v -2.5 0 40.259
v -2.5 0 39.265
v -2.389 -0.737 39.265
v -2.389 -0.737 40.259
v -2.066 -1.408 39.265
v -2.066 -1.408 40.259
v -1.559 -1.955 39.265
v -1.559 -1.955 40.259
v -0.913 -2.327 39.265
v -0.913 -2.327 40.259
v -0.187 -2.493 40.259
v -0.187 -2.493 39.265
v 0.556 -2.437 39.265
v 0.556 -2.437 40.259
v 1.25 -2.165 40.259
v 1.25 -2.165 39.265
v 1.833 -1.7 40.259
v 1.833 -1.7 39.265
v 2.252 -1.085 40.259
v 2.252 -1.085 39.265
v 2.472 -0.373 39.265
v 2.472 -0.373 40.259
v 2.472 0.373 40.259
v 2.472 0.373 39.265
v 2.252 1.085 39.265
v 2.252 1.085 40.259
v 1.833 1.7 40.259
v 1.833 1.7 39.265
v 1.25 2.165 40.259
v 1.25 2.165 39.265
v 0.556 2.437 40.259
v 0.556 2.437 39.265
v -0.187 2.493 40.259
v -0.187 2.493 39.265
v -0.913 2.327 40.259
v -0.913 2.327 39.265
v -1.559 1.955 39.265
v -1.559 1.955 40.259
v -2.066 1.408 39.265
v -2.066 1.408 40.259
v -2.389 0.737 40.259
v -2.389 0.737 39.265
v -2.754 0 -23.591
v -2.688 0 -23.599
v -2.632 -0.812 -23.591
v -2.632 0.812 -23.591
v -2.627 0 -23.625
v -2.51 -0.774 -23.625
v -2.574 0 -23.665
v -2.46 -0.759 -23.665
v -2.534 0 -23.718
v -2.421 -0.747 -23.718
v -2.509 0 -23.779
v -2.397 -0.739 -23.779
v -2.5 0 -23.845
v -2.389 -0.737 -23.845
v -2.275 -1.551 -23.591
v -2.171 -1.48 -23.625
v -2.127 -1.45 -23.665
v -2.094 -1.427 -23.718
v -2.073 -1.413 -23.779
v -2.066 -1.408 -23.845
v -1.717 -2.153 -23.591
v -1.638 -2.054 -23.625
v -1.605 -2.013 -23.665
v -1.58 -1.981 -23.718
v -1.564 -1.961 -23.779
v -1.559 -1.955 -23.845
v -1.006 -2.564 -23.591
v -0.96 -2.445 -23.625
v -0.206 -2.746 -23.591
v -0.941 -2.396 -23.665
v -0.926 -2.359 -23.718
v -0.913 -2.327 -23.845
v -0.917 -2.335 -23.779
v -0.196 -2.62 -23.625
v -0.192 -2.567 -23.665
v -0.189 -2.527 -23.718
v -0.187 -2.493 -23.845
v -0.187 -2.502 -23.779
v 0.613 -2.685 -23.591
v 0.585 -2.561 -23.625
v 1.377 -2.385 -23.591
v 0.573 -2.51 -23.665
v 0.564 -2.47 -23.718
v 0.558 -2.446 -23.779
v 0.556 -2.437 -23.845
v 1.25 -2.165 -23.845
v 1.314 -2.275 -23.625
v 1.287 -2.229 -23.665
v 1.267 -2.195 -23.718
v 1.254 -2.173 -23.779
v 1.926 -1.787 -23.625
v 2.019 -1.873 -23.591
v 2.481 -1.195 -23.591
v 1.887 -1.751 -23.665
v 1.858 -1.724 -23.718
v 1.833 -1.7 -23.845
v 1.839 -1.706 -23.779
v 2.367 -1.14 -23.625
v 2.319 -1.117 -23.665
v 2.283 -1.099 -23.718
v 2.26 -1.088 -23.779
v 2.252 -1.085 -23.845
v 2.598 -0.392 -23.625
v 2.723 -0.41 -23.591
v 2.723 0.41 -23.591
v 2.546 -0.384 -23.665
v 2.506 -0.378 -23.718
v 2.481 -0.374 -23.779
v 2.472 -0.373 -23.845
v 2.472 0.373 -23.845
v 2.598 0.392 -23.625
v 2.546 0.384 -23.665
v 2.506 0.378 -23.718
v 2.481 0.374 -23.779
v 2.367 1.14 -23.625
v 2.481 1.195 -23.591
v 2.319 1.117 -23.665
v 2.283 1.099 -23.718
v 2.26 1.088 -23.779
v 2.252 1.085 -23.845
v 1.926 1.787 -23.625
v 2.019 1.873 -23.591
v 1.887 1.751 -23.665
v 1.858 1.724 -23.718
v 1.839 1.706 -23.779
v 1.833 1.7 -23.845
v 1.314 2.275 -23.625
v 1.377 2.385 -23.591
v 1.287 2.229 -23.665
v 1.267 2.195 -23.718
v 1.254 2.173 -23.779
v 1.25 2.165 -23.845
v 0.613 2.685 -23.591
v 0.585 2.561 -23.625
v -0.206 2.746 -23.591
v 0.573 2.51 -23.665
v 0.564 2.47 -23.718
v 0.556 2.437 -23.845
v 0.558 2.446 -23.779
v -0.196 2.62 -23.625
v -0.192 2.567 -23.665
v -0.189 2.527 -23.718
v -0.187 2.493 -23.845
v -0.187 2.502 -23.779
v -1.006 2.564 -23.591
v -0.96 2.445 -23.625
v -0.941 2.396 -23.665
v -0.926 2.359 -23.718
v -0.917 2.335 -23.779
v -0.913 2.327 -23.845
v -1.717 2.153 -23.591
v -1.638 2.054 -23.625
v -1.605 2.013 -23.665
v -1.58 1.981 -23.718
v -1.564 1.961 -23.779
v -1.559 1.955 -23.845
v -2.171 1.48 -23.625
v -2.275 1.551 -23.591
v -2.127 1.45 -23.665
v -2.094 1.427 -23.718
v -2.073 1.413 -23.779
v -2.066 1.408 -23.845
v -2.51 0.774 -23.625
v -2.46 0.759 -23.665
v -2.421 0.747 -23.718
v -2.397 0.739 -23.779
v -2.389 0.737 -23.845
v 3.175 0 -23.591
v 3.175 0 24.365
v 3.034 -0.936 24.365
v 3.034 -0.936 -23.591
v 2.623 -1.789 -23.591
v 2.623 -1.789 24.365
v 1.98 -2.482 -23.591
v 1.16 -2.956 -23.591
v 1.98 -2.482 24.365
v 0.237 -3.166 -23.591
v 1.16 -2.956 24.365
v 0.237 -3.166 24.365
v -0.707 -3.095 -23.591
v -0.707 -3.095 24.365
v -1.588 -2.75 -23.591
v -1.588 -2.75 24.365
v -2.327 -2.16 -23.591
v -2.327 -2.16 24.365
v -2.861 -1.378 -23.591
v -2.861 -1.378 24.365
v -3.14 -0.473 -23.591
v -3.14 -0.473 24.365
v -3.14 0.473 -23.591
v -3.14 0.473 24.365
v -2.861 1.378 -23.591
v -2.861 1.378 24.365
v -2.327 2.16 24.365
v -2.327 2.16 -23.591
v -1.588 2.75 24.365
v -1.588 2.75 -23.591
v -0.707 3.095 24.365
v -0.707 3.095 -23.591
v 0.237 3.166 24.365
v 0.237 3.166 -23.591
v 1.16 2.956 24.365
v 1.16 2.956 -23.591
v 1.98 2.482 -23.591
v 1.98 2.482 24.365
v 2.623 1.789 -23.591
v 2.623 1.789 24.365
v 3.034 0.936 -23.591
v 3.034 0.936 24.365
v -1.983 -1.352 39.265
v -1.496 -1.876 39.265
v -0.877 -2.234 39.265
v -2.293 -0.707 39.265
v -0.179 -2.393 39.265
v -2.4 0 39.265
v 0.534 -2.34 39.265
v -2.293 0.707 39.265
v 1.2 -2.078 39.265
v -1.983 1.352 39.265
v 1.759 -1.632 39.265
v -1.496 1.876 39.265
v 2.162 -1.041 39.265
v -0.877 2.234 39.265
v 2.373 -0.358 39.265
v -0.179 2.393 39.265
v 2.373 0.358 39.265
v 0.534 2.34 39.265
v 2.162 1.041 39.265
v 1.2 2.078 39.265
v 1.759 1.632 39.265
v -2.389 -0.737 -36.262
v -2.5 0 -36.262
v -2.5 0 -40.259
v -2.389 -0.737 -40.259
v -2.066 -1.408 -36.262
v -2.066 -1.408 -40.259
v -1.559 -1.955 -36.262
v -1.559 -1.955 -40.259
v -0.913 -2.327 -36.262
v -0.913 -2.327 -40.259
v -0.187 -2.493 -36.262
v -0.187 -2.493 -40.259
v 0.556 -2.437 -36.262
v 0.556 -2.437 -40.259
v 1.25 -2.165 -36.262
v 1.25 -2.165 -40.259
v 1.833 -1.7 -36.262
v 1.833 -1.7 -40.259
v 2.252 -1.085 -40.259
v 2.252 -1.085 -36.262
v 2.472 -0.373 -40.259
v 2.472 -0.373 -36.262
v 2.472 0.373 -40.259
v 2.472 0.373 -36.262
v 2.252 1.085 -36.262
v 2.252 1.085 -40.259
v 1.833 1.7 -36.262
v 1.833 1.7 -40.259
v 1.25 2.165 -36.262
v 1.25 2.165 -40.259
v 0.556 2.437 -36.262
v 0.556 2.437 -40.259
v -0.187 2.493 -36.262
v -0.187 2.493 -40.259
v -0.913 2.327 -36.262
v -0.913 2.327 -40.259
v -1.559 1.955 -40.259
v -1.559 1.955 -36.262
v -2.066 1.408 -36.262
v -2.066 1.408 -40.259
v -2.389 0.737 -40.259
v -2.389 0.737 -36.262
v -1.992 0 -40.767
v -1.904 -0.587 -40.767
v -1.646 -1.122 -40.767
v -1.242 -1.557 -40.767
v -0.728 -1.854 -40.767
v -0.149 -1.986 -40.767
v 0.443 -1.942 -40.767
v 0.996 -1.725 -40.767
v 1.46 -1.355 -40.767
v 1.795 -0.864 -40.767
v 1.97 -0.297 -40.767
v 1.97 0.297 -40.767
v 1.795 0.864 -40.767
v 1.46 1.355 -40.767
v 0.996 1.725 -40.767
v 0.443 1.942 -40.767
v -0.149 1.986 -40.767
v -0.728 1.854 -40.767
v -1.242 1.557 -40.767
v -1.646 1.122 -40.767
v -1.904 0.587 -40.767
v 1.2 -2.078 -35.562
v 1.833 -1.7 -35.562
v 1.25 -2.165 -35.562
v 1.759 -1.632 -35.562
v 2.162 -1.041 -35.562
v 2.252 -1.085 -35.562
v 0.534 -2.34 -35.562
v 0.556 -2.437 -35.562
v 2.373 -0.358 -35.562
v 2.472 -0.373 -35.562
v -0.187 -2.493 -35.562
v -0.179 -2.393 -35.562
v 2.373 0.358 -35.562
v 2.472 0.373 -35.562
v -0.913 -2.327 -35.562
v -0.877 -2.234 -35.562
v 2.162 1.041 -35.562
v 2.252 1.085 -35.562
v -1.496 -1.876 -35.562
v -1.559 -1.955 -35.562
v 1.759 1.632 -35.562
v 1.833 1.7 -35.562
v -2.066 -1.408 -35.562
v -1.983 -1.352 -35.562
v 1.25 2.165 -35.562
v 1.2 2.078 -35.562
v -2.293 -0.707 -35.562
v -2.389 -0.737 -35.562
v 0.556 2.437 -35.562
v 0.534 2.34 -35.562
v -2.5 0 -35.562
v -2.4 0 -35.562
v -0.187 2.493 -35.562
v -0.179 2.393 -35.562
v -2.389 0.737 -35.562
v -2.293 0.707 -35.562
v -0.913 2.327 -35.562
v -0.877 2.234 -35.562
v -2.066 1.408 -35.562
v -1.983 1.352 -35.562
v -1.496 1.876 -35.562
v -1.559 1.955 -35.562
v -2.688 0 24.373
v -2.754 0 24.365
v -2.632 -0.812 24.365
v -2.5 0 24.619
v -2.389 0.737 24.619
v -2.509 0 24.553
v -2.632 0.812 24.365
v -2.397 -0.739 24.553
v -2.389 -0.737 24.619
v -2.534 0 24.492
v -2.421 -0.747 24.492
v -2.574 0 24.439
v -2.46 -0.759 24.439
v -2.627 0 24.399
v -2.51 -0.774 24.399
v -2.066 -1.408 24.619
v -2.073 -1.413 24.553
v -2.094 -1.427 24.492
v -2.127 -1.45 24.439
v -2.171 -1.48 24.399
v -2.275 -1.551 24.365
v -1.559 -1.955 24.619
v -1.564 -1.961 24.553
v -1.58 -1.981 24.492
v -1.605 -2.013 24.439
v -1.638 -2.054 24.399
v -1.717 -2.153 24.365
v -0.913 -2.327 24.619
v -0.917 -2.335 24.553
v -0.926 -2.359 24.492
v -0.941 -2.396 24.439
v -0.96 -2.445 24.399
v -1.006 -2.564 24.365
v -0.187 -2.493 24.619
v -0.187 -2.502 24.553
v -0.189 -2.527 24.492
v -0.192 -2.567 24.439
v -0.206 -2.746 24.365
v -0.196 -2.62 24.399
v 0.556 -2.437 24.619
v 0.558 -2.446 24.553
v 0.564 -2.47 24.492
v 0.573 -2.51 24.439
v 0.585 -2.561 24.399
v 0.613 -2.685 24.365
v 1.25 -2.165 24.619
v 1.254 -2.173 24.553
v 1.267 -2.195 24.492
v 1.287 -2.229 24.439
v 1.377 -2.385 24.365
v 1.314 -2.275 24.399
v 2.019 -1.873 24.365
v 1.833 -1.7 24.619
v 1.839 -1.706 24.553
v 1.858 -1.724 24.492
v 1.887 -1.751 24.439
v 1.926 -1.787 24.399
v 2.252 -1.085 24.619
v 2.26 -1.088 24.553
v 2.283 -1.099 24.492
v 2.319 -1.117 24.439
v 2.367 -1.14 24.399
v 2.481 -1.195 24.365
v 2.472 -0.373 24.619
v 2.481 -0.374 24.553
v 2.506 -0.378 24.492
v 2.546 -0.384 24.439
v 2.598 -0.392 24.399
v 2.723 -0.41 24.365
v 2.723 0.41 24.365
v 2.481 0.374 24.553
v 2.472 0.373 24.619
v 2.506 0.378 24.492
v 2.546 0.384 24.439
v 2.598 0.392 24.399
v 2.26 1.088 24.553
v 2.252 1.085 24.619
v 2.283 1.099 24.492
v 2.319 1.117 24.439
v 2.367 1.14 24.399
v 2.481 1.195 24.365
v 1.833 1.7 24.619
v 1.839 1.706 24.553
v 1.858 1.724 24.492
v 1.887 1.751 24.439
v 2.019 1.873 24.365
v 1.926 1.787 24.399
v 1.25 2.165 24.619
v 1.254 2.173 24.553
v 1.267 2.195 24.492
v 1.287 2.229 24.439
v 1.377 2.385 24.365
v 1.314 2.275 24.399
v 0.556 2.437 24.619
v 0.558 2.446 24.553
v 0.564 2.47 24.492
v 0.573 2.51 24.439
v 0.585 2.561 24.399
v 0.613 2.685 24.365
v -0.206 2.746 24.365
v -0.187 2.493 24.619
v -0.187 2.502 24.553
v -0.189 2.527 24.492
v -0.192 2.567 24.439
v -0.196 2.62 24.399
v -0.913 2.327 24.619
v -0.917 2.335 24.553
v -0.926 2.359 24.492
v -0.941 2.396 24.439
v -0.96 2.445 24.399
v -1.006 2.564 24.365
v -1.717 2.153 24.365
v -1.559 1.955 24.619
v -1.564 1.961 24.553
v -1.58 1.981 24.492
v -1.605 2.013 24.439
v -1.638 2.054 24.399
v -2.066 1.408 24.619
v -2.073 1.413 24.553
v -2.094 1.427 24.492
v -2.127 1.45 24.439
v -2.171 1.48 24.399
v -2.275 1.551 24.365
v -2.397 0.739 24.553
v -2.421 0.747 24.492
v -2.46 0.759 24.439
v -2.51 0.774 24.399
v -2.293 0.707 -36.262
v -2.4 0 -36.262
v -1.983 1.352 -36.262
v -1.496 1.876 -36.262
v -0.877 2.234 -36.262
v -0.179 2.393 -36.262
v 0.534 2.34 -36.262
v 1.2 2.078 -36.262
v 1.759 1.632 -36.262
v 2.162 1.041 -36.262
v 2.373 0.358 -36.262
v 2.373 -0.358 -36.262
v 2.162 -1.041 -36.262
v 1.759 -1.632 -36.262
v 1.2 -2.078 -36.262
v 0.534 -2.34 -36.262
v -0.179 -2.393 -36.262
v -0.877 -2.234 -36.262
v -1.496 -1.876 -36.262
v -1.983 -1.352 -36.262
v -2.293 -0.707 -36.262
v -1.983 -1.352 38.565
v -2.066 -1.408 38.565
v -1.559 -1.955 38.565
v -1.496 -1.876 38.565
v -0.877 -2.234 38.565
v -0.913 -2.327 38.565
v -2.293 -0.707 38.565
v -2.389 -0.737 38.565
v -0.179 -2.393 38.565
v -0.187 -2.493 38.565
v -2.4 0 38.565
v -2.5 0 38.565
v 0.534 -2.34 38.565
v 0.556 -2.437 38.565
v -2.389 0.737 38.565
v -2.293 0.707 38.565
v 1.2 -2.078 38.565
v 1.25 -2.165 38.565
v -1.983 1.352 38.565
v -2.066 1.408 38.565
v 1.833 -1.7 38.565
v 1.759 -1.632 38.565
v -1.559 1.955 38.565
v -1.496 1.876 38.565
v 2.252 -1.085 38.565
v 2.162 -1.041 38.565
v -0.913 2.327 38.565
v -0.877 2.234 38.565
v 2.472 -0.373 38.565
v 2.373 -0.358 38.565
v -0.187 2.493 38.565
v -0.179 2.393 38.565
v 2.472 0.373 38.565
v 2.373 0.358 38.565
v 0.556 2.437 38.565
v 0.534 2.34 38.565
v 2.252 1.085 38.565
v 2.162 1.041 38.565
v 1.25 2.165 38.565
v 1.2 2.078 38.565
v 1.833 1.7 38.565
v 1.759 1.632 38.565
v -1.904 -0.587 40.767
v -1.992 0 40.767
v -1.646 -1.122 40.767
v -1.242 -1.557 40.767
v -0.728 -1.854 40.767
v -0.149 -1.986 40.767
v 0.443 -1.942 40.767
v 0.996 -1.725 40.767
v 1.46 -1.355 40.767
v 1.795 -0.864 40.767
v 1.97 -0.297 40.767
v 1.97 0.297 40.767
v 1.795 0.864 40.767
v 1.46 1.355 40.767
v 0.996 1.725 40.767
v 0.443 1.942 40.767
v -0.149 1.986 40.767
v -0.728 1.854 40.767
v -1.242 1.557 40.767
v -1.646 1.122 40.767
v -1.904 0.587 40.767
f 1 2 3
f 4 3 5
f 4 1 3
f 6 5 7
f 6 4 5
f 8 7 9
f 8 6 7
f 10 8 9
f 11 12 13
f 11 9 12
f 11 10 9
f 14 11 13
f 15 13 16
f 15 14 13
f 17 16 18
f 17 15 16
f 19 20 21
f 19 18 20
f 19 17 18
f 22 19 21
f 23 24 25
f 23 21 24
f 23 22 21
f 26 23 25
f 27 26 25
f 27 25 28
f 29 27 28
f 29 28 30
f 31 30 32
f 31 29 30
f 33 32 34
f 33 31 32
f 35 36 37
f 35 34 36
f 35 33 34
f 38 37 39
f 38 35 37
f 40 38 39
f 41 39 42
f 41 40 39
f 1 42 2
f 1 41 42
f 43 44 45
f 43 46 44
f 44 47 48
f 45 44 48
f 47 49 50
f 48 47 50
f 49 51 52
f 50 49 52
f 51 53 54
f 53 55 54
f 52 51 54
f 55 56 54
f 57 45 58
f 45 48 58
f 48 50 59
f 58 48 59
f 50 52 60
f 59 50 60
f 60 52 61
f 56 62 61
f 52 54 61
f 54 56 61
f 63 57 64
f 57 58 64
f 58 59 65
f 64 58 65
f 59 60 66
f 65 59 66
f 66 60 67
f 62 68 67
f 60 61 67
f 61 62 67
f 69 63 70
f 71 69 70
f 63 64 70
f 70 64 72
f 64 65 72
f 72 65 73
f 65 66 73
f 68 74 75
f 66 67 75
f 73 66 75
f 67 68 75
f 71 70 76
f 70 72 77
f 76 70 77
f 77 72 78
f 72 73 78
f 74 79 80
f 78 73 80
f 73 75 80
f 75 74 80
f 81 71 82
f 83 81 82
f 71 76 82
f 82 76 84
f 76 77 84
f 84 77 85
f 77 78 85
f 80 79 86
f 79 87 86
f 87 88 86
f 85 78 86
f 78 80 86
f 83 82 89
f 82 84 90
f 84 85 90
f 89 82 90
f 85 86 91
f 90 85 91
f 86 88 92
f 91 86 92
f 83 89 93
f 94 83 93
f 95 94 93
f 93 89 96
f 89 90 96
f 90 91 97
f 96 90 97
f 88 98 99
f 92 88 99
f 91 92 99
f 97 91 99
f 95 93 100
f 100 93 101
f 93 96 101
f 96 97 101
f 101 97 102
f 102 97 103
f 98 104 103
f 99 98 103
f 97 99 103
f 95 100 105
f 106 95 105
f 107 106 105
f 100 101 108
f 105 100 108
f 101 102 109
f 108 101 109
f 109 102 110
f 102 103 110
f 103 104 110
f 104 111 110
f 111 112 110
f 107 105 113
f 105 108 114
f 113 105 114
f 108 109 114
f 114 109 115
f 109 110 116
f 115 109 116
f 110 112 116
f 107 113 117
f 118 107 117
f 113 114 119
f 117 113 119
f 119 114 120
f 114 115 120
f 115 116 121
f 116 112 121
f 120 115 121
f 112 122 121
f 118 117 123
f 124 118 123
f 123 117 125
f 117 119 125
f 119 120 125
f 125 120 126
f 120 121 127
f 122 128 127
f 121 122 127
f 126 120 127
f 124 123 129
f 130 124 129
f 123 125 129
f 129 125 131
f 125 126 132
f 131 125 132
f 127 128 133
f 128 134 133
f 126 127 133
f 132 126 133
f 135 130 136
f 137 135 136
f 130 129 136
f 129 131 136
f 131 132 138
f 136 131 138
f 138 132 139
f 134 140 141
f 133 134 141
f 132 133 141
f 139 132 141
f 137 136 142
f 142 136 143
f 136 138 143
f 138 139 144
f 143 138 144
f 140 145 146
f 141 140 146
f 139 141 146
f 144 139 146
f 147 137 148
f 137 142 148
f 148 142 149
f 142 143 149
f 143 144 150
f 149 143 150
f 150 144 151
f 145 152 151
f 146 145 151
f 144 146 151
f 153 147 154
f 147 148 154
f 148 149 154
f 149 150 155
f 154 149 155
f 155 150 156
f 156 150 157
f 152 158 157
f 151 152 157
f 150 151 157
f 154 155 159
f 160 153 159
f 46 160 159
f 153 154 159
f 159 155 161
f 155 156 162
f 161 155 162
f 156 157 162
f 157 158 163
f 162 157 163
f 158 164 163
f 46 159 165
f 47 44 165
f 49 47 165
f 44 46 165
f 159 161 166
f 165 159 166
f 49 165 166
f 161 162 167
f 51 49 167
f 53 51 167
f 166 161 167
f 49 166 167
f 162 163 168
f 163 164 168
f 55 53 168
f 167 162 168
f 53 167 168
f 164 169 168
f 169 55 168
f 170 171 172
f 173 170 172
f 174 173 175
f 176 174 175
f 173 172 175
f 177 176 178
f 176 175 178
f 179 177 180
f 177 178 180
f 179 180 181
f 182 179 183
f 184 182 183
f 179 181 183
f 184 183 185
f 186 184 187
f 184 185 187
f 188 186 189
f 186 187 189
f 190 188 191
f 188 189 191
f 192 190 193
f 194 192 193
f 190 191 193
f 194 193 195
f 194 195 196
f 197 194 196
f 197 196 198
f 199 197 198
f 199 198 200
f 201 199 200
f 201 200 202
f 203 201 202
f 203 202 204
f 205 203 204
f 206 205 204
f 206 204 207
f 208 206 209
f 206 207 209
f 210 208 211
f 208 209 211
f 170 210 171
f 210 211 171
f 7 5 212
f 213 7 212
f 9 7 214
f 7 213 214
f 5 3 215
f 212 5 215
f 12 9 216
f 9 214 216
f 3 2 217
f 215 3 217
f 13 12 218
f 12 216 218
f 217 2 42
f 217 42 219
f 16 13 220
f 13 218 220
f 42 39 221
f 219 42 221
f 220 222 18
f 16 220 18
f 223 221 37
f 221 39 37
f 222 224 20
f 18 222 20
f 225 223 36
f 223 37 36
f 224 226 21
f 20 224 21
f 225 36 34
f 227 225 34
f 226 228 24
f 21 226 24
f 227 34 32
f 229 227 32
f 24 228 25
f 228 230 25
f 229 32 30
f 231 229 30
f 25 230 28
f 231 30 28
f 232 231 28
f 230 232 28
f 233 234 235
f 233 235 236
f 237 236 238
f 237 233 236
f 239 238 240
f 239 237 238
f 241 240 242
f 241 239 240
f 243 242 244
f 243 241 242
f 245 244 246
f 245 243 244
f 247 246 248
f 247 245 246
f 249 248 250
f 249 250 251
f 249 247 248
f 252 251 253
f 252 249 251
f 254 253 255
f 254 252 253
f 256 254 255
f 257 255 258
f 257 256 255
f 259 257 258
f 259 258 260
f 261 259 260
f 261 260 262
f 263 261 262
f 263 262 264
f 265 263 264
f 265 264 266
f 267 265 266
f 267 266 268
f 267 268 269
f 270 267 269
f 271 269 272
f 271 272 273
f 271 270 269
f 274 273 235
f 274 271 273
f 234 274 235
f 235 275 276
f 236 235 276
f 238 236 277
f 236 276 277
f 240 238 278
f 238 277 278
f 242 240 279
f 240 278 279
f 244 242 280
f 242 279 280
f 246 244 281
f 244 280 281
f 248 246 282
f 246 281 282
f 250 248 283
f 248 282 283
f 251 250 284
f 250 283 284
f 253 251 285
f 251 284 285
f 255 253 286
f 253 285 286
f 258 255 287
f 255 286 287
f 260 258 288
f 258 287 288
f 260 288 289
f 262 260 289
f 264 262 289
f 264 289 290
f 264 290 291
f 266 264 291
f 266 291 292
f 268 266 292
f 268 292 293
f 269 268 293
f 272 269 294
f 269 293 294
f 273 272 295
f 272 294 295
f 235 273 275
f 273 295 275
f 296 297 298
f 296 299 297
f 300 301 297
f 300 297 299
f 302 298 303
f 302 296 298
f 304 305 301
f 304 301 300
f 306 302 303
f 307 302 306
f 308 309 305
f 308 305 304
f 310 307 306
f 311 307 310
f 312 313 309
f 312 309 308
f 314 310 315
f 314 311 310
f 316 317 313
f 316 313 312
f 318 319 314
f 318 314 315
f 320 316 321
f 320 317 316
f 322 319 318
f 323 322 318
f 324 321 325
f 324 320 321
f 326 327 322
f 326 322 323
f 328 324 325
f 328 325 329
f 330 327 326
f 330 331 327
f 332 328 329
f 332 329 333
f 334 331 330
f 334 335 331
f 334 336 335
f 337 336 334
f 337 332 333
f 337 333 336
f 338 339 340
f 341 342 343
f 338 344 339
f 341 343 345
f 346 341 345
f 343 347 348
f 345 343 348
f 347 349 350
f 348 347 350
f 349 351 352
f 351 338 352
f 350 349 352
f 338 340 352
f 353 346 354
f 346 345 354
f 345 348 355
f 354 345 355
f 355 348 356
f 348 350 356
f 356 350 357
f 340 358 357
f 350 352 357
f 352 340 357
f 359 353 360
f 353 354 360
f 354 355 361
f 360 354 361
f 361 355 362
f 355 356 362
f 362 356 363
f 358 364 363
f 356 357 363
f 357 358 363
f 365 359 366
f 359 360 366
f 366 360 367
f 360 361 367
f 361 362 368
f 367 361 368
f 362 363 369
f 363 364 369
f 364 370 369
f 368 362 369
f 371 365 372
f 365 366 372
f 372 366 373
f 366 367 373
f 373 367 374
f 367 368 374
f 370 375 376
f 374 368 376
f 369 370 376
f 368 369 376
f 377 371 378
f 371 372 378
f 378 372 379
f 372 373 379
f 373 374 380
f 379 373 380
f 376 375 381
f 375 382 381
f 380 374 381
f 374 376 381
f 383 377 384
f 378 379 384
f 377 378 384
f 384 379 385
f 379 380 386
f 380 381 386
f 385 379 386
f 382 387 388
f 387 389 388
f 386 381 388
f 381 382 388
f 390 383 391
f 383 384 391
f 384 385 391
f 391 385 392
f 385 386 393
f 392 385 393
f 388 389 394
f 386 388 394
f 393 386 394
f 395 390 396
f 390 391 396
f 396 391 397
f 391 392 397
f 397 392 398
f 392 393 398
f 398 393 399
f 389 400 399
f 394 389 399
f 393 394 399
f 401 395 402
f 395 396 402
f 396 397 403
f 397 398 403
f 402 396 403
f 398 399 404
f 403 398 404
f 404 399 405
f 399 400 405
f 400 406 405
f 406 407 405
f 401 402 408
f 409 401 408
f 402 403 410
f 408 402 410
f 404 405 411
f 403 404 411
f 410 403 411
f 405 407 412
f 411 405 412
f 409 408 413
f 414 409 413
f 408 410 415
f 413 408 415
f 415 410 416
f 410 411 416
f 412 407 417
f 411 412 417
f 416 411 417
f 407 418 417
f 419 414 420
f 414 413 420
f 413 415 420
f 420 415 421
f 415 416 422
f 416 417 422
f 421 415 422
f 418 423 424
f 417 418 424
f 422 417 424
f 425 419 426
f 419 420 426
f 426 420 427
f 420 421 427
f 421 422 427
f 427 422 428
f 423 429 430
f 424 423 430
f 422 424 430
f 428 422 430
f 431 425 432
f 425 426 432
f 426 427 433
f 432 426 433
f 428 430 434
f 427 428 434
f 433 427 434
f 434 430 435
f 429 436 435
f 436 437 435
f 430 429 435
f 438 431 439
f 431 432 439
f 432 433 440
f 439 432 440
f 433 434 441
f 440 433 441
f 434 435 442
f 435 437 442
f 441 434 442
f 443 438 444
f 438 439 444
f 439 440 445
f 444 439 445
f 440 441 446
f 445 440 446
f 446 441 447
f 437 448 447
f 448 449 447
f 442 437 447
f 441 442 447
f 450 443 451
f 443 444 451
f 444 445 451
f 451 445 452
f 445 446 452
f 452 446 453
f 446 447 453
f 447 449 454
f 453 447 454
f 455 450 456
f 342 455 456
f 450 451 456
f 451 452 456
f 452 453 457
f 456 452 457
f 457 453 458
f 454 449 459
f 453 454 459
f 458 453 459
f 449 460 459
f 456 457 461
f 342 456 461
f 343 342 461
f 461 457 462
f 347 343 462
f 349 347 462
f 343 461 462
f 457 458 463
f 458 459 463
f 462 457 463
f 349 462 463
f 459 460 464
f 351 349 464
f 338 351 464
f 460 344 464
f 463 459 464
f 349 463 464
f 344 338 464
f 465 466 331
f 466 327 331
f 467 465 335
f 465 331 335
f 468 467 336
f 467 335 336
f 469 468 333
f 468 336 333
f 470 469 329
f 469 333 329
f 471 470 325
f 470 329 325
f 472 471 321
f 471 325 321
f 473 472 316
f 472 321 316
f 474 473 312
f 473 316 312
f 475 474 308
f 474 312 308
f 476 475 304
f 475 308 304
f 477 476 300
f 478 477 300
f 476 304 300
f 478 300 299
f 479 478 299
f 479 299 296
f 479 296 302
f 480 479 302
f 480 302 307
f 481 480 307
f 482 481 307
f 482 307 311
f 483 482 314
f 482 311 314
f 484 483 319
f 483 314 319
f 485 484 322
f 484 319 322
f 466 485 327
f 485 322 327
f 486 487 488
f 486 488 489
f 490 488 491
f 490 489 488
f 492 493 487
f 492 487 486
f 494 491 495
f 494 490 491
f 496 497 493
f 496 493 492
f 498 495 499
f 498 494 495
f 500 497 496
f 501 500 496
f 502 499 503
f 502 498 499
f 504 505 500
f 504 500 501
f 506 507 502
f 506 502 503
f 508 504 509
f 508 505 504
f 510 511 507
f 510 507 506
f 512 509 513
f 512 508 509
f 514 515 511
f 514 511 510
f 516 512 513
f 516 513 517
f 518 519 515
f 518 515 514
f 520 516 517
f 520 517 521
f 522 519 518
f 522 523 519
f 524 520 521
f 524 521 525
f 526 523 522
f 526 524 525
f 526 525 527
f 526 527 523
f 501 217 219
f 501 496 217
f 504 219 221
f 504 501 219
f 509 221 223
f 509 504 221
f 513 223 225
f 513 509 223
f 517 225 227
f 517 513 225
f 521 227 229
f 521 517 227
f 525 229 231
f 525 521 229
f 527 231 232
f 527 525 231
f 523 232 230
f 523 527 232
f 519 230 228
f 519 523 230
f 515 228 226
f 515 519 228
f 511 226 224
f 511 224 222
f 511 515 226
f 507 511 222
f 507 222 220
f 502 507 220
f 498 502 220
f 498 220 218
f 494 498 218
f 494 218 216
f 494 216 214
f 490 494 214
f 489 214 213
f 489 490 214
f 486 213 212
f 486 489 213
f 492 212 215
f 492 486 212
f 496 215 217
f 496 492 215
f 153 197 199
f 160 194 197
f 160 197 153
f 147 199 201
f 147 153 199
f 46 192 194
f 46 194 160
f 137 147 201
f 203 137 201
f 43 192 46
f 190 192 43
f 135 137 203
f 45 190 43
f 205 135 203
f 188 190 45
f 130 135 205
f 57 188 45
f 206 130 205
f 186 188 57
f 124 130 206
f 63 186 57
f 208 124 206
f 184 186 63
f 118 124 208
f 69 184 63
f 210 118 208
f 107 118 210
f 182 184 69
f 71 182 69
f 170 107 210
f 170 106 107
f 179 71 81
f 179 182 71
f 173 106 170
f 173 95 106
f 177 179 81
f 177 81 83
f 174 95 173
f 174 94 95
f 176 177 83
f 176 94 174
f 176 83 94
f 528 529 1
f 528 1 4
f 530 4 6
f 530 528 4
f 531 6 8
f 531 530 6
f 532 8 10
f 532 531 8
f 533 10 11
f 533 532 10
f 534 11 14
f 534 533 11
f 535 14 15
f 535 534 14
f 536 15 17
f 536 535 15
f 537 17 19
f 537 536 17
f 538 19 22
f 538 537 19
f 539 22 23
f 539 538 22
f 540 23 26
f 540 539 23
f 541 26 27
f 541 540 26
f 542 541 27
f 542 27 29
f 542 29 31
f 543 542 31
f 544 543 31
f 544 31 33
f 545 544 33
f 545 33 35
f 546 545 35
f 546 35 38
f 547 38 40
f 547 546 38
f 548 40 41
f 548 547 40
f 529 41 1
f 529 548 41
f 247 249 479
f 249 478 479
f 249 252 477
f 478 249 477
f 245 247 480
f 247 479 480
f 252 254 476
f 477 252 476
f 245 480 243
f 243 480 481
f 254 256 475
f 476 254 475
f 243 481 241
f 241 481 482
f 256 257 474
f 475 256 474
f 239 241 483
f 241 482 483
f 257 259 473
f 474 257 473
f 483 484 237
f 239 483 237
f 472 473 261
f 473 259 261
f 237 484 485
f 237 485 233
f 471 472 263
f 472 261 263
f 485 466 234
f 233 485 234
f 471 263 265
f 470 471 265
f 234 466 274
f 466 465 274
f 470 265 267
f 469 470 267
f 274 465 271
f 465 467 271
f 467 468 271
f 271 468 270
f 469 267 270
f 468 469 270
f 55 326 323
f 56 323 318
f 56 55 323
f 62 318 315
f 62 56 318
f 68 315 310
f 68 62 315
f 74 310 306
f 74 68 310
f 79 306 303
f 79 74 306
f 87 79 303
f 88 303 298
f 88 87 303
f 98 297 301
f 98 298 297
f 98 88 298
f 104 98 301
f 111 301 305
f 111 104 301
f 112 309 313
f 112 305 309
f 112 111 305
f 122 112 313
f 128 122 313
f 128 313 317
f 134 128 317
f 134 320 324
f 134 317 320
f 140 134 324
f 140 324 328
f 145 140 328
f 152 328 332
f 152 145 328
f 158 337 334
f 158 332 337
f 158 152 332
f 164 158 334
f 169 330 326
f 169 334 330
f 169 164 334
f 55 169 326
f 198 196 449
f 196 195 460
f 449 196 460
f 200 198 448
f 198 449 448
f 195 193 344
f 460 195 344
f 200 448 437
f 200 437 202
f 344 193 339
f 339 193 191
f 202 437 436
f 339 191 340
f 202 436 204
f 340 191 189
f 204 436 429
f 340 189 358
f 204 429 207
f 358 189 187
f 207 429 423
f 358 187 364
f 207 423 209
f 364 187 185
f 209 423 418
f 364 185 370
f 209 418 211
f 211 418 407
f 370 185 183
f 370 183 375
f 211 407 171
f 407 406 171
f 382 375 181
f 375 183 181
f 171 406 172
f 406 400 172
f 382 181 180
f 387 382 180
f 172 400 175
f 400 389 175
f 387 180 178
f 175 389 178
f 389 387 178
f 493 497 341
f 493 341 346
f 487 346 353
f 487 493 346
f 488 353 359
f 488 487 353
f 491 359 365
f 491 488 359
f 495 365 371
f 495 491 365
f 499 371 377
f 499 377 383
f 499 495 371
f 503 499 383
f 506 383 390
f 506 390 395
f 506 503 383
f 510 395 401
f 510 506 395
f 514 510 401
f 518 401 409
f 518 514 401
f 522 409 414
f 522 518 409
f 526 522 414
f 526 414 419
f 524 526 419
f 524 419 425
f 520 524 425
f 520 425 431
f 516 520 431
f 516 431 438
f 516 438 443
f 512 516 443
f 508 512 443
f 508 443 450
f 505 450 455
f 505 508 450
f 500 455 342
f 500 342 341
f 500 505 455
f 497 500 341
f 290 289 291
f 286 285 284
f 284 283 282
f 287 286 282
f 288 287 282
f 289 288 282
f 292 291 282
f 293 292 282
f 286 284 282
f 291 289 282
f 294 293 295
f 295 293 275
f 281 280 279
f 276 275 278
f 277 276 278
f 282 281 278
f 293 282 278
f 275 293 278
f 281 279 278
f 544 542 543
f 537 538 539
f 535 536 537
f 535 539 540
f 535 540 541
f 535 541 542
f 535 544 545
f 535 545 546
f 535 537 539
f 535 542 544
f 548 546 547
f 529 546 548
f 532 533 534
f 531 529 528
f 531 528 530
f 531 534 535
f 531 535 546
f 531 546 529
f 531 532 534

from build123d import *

# Parameters (mm, degrees)
SKETCH1_R           = 2.5
BOSS_EXTRUDE1_DEPTH = 40.767
SKETCH2_W           = 0.7
SKETCH2_H           = 0.1
SKETCH5_R           = 3.175
BOSS_EXTRUDE3_DEPTH = 47.9552
SKETCH7_W           = 0.7
SKETCH7_H           = 0.1
CHAMFER1_SIZE       = 0.508
FILLET1_R           = 0.254


with BuildPart() as part:
    # Sketch1 → Boss-Extrude1 (new, symmetric)
    with BuildSketch(Plane.XY):
        with Locations(Location((0, 0, 0), (0, 0, 180))):
            Circle(SKETCH1_R)
    extrude(amount=BOSS_EXTRUDE1_DEPTH, both=True)

    # Sketch2 → Cut-Revolve1 (revolve, cut)
    with BuildSketch(Plane(origin=(0, 0, 0), x_dir=(0, 0, -1), z_dir=(1, 0, 0)), mode=Mode.PRIVATE) as cut_revolve1_sk:
        with Locations((-38.914555436, 2.45)):
            Rectangle(SKETCH2_W, SKETCH2_H)
    revolve(cut_revolve1_sk.sketch.rotate(Axis((0, 0, 40.767), (0, 0, -1)), 270), axis=Axis((0, 0, 40.767), (0, 0, -1)), mode=Mode.SUBTRACT)

    # Sketch5 → Boss-Extrude3 (add)
    with BuildSketch(Plane(origin=(0, 0, 24.364555436), x_dir=(-1, 0, 0), z_dir=(0, 0, -1))):
        with Locations(Location((0, 0, 0), (0, 0, 180))):
            Circle(SKETCH5_R)
    extrude(amount=BOSS_EXTRUDE3_DEPTH)

    # Sketch7 → Cut-Revolve2 (revolve, cut)
    with BuildSketch(Plane(origin=(0, -92.71594082, 0), x_dir=(0, 0, 1), z_dir=(1, 0, 0)), mode=Mode.PRIVATE) as cut_revolve2_sk:
        with Locations((-35.912002714, -95.16594082)):
            Rectangle(SKETCH7_W, SKETCH7_H)
    revolve(cut_revolve2_sk.sketch.rotate(Axis((0, 0, -23.590644564), (0, 0, -1)), 270), axis=Axis((0, 0, -23.590644564), (0, 0, -1)), mode=Mode.SUBTRACT)

    # Chamfer1
    chamfer1_edges = [part.edges().sort_by_distance(p)[0] for p in [
        (2.5, 0, -40.767),
        (2.5, 0, 40.767),
    ]]
    chamfer(chamfer1_edges, length=CHAMFER1_SIZE)

    # Fillet1
    fillet1_edges = [part.edges().sort_by_distance(p)[0] for p in [
        (2.5, 0, 24.364555436),
        (2.5, 0, -23.590644564),
    ]]
    fillet(fillet1_edges, radius=FILLET1_R)


solid = part.part
